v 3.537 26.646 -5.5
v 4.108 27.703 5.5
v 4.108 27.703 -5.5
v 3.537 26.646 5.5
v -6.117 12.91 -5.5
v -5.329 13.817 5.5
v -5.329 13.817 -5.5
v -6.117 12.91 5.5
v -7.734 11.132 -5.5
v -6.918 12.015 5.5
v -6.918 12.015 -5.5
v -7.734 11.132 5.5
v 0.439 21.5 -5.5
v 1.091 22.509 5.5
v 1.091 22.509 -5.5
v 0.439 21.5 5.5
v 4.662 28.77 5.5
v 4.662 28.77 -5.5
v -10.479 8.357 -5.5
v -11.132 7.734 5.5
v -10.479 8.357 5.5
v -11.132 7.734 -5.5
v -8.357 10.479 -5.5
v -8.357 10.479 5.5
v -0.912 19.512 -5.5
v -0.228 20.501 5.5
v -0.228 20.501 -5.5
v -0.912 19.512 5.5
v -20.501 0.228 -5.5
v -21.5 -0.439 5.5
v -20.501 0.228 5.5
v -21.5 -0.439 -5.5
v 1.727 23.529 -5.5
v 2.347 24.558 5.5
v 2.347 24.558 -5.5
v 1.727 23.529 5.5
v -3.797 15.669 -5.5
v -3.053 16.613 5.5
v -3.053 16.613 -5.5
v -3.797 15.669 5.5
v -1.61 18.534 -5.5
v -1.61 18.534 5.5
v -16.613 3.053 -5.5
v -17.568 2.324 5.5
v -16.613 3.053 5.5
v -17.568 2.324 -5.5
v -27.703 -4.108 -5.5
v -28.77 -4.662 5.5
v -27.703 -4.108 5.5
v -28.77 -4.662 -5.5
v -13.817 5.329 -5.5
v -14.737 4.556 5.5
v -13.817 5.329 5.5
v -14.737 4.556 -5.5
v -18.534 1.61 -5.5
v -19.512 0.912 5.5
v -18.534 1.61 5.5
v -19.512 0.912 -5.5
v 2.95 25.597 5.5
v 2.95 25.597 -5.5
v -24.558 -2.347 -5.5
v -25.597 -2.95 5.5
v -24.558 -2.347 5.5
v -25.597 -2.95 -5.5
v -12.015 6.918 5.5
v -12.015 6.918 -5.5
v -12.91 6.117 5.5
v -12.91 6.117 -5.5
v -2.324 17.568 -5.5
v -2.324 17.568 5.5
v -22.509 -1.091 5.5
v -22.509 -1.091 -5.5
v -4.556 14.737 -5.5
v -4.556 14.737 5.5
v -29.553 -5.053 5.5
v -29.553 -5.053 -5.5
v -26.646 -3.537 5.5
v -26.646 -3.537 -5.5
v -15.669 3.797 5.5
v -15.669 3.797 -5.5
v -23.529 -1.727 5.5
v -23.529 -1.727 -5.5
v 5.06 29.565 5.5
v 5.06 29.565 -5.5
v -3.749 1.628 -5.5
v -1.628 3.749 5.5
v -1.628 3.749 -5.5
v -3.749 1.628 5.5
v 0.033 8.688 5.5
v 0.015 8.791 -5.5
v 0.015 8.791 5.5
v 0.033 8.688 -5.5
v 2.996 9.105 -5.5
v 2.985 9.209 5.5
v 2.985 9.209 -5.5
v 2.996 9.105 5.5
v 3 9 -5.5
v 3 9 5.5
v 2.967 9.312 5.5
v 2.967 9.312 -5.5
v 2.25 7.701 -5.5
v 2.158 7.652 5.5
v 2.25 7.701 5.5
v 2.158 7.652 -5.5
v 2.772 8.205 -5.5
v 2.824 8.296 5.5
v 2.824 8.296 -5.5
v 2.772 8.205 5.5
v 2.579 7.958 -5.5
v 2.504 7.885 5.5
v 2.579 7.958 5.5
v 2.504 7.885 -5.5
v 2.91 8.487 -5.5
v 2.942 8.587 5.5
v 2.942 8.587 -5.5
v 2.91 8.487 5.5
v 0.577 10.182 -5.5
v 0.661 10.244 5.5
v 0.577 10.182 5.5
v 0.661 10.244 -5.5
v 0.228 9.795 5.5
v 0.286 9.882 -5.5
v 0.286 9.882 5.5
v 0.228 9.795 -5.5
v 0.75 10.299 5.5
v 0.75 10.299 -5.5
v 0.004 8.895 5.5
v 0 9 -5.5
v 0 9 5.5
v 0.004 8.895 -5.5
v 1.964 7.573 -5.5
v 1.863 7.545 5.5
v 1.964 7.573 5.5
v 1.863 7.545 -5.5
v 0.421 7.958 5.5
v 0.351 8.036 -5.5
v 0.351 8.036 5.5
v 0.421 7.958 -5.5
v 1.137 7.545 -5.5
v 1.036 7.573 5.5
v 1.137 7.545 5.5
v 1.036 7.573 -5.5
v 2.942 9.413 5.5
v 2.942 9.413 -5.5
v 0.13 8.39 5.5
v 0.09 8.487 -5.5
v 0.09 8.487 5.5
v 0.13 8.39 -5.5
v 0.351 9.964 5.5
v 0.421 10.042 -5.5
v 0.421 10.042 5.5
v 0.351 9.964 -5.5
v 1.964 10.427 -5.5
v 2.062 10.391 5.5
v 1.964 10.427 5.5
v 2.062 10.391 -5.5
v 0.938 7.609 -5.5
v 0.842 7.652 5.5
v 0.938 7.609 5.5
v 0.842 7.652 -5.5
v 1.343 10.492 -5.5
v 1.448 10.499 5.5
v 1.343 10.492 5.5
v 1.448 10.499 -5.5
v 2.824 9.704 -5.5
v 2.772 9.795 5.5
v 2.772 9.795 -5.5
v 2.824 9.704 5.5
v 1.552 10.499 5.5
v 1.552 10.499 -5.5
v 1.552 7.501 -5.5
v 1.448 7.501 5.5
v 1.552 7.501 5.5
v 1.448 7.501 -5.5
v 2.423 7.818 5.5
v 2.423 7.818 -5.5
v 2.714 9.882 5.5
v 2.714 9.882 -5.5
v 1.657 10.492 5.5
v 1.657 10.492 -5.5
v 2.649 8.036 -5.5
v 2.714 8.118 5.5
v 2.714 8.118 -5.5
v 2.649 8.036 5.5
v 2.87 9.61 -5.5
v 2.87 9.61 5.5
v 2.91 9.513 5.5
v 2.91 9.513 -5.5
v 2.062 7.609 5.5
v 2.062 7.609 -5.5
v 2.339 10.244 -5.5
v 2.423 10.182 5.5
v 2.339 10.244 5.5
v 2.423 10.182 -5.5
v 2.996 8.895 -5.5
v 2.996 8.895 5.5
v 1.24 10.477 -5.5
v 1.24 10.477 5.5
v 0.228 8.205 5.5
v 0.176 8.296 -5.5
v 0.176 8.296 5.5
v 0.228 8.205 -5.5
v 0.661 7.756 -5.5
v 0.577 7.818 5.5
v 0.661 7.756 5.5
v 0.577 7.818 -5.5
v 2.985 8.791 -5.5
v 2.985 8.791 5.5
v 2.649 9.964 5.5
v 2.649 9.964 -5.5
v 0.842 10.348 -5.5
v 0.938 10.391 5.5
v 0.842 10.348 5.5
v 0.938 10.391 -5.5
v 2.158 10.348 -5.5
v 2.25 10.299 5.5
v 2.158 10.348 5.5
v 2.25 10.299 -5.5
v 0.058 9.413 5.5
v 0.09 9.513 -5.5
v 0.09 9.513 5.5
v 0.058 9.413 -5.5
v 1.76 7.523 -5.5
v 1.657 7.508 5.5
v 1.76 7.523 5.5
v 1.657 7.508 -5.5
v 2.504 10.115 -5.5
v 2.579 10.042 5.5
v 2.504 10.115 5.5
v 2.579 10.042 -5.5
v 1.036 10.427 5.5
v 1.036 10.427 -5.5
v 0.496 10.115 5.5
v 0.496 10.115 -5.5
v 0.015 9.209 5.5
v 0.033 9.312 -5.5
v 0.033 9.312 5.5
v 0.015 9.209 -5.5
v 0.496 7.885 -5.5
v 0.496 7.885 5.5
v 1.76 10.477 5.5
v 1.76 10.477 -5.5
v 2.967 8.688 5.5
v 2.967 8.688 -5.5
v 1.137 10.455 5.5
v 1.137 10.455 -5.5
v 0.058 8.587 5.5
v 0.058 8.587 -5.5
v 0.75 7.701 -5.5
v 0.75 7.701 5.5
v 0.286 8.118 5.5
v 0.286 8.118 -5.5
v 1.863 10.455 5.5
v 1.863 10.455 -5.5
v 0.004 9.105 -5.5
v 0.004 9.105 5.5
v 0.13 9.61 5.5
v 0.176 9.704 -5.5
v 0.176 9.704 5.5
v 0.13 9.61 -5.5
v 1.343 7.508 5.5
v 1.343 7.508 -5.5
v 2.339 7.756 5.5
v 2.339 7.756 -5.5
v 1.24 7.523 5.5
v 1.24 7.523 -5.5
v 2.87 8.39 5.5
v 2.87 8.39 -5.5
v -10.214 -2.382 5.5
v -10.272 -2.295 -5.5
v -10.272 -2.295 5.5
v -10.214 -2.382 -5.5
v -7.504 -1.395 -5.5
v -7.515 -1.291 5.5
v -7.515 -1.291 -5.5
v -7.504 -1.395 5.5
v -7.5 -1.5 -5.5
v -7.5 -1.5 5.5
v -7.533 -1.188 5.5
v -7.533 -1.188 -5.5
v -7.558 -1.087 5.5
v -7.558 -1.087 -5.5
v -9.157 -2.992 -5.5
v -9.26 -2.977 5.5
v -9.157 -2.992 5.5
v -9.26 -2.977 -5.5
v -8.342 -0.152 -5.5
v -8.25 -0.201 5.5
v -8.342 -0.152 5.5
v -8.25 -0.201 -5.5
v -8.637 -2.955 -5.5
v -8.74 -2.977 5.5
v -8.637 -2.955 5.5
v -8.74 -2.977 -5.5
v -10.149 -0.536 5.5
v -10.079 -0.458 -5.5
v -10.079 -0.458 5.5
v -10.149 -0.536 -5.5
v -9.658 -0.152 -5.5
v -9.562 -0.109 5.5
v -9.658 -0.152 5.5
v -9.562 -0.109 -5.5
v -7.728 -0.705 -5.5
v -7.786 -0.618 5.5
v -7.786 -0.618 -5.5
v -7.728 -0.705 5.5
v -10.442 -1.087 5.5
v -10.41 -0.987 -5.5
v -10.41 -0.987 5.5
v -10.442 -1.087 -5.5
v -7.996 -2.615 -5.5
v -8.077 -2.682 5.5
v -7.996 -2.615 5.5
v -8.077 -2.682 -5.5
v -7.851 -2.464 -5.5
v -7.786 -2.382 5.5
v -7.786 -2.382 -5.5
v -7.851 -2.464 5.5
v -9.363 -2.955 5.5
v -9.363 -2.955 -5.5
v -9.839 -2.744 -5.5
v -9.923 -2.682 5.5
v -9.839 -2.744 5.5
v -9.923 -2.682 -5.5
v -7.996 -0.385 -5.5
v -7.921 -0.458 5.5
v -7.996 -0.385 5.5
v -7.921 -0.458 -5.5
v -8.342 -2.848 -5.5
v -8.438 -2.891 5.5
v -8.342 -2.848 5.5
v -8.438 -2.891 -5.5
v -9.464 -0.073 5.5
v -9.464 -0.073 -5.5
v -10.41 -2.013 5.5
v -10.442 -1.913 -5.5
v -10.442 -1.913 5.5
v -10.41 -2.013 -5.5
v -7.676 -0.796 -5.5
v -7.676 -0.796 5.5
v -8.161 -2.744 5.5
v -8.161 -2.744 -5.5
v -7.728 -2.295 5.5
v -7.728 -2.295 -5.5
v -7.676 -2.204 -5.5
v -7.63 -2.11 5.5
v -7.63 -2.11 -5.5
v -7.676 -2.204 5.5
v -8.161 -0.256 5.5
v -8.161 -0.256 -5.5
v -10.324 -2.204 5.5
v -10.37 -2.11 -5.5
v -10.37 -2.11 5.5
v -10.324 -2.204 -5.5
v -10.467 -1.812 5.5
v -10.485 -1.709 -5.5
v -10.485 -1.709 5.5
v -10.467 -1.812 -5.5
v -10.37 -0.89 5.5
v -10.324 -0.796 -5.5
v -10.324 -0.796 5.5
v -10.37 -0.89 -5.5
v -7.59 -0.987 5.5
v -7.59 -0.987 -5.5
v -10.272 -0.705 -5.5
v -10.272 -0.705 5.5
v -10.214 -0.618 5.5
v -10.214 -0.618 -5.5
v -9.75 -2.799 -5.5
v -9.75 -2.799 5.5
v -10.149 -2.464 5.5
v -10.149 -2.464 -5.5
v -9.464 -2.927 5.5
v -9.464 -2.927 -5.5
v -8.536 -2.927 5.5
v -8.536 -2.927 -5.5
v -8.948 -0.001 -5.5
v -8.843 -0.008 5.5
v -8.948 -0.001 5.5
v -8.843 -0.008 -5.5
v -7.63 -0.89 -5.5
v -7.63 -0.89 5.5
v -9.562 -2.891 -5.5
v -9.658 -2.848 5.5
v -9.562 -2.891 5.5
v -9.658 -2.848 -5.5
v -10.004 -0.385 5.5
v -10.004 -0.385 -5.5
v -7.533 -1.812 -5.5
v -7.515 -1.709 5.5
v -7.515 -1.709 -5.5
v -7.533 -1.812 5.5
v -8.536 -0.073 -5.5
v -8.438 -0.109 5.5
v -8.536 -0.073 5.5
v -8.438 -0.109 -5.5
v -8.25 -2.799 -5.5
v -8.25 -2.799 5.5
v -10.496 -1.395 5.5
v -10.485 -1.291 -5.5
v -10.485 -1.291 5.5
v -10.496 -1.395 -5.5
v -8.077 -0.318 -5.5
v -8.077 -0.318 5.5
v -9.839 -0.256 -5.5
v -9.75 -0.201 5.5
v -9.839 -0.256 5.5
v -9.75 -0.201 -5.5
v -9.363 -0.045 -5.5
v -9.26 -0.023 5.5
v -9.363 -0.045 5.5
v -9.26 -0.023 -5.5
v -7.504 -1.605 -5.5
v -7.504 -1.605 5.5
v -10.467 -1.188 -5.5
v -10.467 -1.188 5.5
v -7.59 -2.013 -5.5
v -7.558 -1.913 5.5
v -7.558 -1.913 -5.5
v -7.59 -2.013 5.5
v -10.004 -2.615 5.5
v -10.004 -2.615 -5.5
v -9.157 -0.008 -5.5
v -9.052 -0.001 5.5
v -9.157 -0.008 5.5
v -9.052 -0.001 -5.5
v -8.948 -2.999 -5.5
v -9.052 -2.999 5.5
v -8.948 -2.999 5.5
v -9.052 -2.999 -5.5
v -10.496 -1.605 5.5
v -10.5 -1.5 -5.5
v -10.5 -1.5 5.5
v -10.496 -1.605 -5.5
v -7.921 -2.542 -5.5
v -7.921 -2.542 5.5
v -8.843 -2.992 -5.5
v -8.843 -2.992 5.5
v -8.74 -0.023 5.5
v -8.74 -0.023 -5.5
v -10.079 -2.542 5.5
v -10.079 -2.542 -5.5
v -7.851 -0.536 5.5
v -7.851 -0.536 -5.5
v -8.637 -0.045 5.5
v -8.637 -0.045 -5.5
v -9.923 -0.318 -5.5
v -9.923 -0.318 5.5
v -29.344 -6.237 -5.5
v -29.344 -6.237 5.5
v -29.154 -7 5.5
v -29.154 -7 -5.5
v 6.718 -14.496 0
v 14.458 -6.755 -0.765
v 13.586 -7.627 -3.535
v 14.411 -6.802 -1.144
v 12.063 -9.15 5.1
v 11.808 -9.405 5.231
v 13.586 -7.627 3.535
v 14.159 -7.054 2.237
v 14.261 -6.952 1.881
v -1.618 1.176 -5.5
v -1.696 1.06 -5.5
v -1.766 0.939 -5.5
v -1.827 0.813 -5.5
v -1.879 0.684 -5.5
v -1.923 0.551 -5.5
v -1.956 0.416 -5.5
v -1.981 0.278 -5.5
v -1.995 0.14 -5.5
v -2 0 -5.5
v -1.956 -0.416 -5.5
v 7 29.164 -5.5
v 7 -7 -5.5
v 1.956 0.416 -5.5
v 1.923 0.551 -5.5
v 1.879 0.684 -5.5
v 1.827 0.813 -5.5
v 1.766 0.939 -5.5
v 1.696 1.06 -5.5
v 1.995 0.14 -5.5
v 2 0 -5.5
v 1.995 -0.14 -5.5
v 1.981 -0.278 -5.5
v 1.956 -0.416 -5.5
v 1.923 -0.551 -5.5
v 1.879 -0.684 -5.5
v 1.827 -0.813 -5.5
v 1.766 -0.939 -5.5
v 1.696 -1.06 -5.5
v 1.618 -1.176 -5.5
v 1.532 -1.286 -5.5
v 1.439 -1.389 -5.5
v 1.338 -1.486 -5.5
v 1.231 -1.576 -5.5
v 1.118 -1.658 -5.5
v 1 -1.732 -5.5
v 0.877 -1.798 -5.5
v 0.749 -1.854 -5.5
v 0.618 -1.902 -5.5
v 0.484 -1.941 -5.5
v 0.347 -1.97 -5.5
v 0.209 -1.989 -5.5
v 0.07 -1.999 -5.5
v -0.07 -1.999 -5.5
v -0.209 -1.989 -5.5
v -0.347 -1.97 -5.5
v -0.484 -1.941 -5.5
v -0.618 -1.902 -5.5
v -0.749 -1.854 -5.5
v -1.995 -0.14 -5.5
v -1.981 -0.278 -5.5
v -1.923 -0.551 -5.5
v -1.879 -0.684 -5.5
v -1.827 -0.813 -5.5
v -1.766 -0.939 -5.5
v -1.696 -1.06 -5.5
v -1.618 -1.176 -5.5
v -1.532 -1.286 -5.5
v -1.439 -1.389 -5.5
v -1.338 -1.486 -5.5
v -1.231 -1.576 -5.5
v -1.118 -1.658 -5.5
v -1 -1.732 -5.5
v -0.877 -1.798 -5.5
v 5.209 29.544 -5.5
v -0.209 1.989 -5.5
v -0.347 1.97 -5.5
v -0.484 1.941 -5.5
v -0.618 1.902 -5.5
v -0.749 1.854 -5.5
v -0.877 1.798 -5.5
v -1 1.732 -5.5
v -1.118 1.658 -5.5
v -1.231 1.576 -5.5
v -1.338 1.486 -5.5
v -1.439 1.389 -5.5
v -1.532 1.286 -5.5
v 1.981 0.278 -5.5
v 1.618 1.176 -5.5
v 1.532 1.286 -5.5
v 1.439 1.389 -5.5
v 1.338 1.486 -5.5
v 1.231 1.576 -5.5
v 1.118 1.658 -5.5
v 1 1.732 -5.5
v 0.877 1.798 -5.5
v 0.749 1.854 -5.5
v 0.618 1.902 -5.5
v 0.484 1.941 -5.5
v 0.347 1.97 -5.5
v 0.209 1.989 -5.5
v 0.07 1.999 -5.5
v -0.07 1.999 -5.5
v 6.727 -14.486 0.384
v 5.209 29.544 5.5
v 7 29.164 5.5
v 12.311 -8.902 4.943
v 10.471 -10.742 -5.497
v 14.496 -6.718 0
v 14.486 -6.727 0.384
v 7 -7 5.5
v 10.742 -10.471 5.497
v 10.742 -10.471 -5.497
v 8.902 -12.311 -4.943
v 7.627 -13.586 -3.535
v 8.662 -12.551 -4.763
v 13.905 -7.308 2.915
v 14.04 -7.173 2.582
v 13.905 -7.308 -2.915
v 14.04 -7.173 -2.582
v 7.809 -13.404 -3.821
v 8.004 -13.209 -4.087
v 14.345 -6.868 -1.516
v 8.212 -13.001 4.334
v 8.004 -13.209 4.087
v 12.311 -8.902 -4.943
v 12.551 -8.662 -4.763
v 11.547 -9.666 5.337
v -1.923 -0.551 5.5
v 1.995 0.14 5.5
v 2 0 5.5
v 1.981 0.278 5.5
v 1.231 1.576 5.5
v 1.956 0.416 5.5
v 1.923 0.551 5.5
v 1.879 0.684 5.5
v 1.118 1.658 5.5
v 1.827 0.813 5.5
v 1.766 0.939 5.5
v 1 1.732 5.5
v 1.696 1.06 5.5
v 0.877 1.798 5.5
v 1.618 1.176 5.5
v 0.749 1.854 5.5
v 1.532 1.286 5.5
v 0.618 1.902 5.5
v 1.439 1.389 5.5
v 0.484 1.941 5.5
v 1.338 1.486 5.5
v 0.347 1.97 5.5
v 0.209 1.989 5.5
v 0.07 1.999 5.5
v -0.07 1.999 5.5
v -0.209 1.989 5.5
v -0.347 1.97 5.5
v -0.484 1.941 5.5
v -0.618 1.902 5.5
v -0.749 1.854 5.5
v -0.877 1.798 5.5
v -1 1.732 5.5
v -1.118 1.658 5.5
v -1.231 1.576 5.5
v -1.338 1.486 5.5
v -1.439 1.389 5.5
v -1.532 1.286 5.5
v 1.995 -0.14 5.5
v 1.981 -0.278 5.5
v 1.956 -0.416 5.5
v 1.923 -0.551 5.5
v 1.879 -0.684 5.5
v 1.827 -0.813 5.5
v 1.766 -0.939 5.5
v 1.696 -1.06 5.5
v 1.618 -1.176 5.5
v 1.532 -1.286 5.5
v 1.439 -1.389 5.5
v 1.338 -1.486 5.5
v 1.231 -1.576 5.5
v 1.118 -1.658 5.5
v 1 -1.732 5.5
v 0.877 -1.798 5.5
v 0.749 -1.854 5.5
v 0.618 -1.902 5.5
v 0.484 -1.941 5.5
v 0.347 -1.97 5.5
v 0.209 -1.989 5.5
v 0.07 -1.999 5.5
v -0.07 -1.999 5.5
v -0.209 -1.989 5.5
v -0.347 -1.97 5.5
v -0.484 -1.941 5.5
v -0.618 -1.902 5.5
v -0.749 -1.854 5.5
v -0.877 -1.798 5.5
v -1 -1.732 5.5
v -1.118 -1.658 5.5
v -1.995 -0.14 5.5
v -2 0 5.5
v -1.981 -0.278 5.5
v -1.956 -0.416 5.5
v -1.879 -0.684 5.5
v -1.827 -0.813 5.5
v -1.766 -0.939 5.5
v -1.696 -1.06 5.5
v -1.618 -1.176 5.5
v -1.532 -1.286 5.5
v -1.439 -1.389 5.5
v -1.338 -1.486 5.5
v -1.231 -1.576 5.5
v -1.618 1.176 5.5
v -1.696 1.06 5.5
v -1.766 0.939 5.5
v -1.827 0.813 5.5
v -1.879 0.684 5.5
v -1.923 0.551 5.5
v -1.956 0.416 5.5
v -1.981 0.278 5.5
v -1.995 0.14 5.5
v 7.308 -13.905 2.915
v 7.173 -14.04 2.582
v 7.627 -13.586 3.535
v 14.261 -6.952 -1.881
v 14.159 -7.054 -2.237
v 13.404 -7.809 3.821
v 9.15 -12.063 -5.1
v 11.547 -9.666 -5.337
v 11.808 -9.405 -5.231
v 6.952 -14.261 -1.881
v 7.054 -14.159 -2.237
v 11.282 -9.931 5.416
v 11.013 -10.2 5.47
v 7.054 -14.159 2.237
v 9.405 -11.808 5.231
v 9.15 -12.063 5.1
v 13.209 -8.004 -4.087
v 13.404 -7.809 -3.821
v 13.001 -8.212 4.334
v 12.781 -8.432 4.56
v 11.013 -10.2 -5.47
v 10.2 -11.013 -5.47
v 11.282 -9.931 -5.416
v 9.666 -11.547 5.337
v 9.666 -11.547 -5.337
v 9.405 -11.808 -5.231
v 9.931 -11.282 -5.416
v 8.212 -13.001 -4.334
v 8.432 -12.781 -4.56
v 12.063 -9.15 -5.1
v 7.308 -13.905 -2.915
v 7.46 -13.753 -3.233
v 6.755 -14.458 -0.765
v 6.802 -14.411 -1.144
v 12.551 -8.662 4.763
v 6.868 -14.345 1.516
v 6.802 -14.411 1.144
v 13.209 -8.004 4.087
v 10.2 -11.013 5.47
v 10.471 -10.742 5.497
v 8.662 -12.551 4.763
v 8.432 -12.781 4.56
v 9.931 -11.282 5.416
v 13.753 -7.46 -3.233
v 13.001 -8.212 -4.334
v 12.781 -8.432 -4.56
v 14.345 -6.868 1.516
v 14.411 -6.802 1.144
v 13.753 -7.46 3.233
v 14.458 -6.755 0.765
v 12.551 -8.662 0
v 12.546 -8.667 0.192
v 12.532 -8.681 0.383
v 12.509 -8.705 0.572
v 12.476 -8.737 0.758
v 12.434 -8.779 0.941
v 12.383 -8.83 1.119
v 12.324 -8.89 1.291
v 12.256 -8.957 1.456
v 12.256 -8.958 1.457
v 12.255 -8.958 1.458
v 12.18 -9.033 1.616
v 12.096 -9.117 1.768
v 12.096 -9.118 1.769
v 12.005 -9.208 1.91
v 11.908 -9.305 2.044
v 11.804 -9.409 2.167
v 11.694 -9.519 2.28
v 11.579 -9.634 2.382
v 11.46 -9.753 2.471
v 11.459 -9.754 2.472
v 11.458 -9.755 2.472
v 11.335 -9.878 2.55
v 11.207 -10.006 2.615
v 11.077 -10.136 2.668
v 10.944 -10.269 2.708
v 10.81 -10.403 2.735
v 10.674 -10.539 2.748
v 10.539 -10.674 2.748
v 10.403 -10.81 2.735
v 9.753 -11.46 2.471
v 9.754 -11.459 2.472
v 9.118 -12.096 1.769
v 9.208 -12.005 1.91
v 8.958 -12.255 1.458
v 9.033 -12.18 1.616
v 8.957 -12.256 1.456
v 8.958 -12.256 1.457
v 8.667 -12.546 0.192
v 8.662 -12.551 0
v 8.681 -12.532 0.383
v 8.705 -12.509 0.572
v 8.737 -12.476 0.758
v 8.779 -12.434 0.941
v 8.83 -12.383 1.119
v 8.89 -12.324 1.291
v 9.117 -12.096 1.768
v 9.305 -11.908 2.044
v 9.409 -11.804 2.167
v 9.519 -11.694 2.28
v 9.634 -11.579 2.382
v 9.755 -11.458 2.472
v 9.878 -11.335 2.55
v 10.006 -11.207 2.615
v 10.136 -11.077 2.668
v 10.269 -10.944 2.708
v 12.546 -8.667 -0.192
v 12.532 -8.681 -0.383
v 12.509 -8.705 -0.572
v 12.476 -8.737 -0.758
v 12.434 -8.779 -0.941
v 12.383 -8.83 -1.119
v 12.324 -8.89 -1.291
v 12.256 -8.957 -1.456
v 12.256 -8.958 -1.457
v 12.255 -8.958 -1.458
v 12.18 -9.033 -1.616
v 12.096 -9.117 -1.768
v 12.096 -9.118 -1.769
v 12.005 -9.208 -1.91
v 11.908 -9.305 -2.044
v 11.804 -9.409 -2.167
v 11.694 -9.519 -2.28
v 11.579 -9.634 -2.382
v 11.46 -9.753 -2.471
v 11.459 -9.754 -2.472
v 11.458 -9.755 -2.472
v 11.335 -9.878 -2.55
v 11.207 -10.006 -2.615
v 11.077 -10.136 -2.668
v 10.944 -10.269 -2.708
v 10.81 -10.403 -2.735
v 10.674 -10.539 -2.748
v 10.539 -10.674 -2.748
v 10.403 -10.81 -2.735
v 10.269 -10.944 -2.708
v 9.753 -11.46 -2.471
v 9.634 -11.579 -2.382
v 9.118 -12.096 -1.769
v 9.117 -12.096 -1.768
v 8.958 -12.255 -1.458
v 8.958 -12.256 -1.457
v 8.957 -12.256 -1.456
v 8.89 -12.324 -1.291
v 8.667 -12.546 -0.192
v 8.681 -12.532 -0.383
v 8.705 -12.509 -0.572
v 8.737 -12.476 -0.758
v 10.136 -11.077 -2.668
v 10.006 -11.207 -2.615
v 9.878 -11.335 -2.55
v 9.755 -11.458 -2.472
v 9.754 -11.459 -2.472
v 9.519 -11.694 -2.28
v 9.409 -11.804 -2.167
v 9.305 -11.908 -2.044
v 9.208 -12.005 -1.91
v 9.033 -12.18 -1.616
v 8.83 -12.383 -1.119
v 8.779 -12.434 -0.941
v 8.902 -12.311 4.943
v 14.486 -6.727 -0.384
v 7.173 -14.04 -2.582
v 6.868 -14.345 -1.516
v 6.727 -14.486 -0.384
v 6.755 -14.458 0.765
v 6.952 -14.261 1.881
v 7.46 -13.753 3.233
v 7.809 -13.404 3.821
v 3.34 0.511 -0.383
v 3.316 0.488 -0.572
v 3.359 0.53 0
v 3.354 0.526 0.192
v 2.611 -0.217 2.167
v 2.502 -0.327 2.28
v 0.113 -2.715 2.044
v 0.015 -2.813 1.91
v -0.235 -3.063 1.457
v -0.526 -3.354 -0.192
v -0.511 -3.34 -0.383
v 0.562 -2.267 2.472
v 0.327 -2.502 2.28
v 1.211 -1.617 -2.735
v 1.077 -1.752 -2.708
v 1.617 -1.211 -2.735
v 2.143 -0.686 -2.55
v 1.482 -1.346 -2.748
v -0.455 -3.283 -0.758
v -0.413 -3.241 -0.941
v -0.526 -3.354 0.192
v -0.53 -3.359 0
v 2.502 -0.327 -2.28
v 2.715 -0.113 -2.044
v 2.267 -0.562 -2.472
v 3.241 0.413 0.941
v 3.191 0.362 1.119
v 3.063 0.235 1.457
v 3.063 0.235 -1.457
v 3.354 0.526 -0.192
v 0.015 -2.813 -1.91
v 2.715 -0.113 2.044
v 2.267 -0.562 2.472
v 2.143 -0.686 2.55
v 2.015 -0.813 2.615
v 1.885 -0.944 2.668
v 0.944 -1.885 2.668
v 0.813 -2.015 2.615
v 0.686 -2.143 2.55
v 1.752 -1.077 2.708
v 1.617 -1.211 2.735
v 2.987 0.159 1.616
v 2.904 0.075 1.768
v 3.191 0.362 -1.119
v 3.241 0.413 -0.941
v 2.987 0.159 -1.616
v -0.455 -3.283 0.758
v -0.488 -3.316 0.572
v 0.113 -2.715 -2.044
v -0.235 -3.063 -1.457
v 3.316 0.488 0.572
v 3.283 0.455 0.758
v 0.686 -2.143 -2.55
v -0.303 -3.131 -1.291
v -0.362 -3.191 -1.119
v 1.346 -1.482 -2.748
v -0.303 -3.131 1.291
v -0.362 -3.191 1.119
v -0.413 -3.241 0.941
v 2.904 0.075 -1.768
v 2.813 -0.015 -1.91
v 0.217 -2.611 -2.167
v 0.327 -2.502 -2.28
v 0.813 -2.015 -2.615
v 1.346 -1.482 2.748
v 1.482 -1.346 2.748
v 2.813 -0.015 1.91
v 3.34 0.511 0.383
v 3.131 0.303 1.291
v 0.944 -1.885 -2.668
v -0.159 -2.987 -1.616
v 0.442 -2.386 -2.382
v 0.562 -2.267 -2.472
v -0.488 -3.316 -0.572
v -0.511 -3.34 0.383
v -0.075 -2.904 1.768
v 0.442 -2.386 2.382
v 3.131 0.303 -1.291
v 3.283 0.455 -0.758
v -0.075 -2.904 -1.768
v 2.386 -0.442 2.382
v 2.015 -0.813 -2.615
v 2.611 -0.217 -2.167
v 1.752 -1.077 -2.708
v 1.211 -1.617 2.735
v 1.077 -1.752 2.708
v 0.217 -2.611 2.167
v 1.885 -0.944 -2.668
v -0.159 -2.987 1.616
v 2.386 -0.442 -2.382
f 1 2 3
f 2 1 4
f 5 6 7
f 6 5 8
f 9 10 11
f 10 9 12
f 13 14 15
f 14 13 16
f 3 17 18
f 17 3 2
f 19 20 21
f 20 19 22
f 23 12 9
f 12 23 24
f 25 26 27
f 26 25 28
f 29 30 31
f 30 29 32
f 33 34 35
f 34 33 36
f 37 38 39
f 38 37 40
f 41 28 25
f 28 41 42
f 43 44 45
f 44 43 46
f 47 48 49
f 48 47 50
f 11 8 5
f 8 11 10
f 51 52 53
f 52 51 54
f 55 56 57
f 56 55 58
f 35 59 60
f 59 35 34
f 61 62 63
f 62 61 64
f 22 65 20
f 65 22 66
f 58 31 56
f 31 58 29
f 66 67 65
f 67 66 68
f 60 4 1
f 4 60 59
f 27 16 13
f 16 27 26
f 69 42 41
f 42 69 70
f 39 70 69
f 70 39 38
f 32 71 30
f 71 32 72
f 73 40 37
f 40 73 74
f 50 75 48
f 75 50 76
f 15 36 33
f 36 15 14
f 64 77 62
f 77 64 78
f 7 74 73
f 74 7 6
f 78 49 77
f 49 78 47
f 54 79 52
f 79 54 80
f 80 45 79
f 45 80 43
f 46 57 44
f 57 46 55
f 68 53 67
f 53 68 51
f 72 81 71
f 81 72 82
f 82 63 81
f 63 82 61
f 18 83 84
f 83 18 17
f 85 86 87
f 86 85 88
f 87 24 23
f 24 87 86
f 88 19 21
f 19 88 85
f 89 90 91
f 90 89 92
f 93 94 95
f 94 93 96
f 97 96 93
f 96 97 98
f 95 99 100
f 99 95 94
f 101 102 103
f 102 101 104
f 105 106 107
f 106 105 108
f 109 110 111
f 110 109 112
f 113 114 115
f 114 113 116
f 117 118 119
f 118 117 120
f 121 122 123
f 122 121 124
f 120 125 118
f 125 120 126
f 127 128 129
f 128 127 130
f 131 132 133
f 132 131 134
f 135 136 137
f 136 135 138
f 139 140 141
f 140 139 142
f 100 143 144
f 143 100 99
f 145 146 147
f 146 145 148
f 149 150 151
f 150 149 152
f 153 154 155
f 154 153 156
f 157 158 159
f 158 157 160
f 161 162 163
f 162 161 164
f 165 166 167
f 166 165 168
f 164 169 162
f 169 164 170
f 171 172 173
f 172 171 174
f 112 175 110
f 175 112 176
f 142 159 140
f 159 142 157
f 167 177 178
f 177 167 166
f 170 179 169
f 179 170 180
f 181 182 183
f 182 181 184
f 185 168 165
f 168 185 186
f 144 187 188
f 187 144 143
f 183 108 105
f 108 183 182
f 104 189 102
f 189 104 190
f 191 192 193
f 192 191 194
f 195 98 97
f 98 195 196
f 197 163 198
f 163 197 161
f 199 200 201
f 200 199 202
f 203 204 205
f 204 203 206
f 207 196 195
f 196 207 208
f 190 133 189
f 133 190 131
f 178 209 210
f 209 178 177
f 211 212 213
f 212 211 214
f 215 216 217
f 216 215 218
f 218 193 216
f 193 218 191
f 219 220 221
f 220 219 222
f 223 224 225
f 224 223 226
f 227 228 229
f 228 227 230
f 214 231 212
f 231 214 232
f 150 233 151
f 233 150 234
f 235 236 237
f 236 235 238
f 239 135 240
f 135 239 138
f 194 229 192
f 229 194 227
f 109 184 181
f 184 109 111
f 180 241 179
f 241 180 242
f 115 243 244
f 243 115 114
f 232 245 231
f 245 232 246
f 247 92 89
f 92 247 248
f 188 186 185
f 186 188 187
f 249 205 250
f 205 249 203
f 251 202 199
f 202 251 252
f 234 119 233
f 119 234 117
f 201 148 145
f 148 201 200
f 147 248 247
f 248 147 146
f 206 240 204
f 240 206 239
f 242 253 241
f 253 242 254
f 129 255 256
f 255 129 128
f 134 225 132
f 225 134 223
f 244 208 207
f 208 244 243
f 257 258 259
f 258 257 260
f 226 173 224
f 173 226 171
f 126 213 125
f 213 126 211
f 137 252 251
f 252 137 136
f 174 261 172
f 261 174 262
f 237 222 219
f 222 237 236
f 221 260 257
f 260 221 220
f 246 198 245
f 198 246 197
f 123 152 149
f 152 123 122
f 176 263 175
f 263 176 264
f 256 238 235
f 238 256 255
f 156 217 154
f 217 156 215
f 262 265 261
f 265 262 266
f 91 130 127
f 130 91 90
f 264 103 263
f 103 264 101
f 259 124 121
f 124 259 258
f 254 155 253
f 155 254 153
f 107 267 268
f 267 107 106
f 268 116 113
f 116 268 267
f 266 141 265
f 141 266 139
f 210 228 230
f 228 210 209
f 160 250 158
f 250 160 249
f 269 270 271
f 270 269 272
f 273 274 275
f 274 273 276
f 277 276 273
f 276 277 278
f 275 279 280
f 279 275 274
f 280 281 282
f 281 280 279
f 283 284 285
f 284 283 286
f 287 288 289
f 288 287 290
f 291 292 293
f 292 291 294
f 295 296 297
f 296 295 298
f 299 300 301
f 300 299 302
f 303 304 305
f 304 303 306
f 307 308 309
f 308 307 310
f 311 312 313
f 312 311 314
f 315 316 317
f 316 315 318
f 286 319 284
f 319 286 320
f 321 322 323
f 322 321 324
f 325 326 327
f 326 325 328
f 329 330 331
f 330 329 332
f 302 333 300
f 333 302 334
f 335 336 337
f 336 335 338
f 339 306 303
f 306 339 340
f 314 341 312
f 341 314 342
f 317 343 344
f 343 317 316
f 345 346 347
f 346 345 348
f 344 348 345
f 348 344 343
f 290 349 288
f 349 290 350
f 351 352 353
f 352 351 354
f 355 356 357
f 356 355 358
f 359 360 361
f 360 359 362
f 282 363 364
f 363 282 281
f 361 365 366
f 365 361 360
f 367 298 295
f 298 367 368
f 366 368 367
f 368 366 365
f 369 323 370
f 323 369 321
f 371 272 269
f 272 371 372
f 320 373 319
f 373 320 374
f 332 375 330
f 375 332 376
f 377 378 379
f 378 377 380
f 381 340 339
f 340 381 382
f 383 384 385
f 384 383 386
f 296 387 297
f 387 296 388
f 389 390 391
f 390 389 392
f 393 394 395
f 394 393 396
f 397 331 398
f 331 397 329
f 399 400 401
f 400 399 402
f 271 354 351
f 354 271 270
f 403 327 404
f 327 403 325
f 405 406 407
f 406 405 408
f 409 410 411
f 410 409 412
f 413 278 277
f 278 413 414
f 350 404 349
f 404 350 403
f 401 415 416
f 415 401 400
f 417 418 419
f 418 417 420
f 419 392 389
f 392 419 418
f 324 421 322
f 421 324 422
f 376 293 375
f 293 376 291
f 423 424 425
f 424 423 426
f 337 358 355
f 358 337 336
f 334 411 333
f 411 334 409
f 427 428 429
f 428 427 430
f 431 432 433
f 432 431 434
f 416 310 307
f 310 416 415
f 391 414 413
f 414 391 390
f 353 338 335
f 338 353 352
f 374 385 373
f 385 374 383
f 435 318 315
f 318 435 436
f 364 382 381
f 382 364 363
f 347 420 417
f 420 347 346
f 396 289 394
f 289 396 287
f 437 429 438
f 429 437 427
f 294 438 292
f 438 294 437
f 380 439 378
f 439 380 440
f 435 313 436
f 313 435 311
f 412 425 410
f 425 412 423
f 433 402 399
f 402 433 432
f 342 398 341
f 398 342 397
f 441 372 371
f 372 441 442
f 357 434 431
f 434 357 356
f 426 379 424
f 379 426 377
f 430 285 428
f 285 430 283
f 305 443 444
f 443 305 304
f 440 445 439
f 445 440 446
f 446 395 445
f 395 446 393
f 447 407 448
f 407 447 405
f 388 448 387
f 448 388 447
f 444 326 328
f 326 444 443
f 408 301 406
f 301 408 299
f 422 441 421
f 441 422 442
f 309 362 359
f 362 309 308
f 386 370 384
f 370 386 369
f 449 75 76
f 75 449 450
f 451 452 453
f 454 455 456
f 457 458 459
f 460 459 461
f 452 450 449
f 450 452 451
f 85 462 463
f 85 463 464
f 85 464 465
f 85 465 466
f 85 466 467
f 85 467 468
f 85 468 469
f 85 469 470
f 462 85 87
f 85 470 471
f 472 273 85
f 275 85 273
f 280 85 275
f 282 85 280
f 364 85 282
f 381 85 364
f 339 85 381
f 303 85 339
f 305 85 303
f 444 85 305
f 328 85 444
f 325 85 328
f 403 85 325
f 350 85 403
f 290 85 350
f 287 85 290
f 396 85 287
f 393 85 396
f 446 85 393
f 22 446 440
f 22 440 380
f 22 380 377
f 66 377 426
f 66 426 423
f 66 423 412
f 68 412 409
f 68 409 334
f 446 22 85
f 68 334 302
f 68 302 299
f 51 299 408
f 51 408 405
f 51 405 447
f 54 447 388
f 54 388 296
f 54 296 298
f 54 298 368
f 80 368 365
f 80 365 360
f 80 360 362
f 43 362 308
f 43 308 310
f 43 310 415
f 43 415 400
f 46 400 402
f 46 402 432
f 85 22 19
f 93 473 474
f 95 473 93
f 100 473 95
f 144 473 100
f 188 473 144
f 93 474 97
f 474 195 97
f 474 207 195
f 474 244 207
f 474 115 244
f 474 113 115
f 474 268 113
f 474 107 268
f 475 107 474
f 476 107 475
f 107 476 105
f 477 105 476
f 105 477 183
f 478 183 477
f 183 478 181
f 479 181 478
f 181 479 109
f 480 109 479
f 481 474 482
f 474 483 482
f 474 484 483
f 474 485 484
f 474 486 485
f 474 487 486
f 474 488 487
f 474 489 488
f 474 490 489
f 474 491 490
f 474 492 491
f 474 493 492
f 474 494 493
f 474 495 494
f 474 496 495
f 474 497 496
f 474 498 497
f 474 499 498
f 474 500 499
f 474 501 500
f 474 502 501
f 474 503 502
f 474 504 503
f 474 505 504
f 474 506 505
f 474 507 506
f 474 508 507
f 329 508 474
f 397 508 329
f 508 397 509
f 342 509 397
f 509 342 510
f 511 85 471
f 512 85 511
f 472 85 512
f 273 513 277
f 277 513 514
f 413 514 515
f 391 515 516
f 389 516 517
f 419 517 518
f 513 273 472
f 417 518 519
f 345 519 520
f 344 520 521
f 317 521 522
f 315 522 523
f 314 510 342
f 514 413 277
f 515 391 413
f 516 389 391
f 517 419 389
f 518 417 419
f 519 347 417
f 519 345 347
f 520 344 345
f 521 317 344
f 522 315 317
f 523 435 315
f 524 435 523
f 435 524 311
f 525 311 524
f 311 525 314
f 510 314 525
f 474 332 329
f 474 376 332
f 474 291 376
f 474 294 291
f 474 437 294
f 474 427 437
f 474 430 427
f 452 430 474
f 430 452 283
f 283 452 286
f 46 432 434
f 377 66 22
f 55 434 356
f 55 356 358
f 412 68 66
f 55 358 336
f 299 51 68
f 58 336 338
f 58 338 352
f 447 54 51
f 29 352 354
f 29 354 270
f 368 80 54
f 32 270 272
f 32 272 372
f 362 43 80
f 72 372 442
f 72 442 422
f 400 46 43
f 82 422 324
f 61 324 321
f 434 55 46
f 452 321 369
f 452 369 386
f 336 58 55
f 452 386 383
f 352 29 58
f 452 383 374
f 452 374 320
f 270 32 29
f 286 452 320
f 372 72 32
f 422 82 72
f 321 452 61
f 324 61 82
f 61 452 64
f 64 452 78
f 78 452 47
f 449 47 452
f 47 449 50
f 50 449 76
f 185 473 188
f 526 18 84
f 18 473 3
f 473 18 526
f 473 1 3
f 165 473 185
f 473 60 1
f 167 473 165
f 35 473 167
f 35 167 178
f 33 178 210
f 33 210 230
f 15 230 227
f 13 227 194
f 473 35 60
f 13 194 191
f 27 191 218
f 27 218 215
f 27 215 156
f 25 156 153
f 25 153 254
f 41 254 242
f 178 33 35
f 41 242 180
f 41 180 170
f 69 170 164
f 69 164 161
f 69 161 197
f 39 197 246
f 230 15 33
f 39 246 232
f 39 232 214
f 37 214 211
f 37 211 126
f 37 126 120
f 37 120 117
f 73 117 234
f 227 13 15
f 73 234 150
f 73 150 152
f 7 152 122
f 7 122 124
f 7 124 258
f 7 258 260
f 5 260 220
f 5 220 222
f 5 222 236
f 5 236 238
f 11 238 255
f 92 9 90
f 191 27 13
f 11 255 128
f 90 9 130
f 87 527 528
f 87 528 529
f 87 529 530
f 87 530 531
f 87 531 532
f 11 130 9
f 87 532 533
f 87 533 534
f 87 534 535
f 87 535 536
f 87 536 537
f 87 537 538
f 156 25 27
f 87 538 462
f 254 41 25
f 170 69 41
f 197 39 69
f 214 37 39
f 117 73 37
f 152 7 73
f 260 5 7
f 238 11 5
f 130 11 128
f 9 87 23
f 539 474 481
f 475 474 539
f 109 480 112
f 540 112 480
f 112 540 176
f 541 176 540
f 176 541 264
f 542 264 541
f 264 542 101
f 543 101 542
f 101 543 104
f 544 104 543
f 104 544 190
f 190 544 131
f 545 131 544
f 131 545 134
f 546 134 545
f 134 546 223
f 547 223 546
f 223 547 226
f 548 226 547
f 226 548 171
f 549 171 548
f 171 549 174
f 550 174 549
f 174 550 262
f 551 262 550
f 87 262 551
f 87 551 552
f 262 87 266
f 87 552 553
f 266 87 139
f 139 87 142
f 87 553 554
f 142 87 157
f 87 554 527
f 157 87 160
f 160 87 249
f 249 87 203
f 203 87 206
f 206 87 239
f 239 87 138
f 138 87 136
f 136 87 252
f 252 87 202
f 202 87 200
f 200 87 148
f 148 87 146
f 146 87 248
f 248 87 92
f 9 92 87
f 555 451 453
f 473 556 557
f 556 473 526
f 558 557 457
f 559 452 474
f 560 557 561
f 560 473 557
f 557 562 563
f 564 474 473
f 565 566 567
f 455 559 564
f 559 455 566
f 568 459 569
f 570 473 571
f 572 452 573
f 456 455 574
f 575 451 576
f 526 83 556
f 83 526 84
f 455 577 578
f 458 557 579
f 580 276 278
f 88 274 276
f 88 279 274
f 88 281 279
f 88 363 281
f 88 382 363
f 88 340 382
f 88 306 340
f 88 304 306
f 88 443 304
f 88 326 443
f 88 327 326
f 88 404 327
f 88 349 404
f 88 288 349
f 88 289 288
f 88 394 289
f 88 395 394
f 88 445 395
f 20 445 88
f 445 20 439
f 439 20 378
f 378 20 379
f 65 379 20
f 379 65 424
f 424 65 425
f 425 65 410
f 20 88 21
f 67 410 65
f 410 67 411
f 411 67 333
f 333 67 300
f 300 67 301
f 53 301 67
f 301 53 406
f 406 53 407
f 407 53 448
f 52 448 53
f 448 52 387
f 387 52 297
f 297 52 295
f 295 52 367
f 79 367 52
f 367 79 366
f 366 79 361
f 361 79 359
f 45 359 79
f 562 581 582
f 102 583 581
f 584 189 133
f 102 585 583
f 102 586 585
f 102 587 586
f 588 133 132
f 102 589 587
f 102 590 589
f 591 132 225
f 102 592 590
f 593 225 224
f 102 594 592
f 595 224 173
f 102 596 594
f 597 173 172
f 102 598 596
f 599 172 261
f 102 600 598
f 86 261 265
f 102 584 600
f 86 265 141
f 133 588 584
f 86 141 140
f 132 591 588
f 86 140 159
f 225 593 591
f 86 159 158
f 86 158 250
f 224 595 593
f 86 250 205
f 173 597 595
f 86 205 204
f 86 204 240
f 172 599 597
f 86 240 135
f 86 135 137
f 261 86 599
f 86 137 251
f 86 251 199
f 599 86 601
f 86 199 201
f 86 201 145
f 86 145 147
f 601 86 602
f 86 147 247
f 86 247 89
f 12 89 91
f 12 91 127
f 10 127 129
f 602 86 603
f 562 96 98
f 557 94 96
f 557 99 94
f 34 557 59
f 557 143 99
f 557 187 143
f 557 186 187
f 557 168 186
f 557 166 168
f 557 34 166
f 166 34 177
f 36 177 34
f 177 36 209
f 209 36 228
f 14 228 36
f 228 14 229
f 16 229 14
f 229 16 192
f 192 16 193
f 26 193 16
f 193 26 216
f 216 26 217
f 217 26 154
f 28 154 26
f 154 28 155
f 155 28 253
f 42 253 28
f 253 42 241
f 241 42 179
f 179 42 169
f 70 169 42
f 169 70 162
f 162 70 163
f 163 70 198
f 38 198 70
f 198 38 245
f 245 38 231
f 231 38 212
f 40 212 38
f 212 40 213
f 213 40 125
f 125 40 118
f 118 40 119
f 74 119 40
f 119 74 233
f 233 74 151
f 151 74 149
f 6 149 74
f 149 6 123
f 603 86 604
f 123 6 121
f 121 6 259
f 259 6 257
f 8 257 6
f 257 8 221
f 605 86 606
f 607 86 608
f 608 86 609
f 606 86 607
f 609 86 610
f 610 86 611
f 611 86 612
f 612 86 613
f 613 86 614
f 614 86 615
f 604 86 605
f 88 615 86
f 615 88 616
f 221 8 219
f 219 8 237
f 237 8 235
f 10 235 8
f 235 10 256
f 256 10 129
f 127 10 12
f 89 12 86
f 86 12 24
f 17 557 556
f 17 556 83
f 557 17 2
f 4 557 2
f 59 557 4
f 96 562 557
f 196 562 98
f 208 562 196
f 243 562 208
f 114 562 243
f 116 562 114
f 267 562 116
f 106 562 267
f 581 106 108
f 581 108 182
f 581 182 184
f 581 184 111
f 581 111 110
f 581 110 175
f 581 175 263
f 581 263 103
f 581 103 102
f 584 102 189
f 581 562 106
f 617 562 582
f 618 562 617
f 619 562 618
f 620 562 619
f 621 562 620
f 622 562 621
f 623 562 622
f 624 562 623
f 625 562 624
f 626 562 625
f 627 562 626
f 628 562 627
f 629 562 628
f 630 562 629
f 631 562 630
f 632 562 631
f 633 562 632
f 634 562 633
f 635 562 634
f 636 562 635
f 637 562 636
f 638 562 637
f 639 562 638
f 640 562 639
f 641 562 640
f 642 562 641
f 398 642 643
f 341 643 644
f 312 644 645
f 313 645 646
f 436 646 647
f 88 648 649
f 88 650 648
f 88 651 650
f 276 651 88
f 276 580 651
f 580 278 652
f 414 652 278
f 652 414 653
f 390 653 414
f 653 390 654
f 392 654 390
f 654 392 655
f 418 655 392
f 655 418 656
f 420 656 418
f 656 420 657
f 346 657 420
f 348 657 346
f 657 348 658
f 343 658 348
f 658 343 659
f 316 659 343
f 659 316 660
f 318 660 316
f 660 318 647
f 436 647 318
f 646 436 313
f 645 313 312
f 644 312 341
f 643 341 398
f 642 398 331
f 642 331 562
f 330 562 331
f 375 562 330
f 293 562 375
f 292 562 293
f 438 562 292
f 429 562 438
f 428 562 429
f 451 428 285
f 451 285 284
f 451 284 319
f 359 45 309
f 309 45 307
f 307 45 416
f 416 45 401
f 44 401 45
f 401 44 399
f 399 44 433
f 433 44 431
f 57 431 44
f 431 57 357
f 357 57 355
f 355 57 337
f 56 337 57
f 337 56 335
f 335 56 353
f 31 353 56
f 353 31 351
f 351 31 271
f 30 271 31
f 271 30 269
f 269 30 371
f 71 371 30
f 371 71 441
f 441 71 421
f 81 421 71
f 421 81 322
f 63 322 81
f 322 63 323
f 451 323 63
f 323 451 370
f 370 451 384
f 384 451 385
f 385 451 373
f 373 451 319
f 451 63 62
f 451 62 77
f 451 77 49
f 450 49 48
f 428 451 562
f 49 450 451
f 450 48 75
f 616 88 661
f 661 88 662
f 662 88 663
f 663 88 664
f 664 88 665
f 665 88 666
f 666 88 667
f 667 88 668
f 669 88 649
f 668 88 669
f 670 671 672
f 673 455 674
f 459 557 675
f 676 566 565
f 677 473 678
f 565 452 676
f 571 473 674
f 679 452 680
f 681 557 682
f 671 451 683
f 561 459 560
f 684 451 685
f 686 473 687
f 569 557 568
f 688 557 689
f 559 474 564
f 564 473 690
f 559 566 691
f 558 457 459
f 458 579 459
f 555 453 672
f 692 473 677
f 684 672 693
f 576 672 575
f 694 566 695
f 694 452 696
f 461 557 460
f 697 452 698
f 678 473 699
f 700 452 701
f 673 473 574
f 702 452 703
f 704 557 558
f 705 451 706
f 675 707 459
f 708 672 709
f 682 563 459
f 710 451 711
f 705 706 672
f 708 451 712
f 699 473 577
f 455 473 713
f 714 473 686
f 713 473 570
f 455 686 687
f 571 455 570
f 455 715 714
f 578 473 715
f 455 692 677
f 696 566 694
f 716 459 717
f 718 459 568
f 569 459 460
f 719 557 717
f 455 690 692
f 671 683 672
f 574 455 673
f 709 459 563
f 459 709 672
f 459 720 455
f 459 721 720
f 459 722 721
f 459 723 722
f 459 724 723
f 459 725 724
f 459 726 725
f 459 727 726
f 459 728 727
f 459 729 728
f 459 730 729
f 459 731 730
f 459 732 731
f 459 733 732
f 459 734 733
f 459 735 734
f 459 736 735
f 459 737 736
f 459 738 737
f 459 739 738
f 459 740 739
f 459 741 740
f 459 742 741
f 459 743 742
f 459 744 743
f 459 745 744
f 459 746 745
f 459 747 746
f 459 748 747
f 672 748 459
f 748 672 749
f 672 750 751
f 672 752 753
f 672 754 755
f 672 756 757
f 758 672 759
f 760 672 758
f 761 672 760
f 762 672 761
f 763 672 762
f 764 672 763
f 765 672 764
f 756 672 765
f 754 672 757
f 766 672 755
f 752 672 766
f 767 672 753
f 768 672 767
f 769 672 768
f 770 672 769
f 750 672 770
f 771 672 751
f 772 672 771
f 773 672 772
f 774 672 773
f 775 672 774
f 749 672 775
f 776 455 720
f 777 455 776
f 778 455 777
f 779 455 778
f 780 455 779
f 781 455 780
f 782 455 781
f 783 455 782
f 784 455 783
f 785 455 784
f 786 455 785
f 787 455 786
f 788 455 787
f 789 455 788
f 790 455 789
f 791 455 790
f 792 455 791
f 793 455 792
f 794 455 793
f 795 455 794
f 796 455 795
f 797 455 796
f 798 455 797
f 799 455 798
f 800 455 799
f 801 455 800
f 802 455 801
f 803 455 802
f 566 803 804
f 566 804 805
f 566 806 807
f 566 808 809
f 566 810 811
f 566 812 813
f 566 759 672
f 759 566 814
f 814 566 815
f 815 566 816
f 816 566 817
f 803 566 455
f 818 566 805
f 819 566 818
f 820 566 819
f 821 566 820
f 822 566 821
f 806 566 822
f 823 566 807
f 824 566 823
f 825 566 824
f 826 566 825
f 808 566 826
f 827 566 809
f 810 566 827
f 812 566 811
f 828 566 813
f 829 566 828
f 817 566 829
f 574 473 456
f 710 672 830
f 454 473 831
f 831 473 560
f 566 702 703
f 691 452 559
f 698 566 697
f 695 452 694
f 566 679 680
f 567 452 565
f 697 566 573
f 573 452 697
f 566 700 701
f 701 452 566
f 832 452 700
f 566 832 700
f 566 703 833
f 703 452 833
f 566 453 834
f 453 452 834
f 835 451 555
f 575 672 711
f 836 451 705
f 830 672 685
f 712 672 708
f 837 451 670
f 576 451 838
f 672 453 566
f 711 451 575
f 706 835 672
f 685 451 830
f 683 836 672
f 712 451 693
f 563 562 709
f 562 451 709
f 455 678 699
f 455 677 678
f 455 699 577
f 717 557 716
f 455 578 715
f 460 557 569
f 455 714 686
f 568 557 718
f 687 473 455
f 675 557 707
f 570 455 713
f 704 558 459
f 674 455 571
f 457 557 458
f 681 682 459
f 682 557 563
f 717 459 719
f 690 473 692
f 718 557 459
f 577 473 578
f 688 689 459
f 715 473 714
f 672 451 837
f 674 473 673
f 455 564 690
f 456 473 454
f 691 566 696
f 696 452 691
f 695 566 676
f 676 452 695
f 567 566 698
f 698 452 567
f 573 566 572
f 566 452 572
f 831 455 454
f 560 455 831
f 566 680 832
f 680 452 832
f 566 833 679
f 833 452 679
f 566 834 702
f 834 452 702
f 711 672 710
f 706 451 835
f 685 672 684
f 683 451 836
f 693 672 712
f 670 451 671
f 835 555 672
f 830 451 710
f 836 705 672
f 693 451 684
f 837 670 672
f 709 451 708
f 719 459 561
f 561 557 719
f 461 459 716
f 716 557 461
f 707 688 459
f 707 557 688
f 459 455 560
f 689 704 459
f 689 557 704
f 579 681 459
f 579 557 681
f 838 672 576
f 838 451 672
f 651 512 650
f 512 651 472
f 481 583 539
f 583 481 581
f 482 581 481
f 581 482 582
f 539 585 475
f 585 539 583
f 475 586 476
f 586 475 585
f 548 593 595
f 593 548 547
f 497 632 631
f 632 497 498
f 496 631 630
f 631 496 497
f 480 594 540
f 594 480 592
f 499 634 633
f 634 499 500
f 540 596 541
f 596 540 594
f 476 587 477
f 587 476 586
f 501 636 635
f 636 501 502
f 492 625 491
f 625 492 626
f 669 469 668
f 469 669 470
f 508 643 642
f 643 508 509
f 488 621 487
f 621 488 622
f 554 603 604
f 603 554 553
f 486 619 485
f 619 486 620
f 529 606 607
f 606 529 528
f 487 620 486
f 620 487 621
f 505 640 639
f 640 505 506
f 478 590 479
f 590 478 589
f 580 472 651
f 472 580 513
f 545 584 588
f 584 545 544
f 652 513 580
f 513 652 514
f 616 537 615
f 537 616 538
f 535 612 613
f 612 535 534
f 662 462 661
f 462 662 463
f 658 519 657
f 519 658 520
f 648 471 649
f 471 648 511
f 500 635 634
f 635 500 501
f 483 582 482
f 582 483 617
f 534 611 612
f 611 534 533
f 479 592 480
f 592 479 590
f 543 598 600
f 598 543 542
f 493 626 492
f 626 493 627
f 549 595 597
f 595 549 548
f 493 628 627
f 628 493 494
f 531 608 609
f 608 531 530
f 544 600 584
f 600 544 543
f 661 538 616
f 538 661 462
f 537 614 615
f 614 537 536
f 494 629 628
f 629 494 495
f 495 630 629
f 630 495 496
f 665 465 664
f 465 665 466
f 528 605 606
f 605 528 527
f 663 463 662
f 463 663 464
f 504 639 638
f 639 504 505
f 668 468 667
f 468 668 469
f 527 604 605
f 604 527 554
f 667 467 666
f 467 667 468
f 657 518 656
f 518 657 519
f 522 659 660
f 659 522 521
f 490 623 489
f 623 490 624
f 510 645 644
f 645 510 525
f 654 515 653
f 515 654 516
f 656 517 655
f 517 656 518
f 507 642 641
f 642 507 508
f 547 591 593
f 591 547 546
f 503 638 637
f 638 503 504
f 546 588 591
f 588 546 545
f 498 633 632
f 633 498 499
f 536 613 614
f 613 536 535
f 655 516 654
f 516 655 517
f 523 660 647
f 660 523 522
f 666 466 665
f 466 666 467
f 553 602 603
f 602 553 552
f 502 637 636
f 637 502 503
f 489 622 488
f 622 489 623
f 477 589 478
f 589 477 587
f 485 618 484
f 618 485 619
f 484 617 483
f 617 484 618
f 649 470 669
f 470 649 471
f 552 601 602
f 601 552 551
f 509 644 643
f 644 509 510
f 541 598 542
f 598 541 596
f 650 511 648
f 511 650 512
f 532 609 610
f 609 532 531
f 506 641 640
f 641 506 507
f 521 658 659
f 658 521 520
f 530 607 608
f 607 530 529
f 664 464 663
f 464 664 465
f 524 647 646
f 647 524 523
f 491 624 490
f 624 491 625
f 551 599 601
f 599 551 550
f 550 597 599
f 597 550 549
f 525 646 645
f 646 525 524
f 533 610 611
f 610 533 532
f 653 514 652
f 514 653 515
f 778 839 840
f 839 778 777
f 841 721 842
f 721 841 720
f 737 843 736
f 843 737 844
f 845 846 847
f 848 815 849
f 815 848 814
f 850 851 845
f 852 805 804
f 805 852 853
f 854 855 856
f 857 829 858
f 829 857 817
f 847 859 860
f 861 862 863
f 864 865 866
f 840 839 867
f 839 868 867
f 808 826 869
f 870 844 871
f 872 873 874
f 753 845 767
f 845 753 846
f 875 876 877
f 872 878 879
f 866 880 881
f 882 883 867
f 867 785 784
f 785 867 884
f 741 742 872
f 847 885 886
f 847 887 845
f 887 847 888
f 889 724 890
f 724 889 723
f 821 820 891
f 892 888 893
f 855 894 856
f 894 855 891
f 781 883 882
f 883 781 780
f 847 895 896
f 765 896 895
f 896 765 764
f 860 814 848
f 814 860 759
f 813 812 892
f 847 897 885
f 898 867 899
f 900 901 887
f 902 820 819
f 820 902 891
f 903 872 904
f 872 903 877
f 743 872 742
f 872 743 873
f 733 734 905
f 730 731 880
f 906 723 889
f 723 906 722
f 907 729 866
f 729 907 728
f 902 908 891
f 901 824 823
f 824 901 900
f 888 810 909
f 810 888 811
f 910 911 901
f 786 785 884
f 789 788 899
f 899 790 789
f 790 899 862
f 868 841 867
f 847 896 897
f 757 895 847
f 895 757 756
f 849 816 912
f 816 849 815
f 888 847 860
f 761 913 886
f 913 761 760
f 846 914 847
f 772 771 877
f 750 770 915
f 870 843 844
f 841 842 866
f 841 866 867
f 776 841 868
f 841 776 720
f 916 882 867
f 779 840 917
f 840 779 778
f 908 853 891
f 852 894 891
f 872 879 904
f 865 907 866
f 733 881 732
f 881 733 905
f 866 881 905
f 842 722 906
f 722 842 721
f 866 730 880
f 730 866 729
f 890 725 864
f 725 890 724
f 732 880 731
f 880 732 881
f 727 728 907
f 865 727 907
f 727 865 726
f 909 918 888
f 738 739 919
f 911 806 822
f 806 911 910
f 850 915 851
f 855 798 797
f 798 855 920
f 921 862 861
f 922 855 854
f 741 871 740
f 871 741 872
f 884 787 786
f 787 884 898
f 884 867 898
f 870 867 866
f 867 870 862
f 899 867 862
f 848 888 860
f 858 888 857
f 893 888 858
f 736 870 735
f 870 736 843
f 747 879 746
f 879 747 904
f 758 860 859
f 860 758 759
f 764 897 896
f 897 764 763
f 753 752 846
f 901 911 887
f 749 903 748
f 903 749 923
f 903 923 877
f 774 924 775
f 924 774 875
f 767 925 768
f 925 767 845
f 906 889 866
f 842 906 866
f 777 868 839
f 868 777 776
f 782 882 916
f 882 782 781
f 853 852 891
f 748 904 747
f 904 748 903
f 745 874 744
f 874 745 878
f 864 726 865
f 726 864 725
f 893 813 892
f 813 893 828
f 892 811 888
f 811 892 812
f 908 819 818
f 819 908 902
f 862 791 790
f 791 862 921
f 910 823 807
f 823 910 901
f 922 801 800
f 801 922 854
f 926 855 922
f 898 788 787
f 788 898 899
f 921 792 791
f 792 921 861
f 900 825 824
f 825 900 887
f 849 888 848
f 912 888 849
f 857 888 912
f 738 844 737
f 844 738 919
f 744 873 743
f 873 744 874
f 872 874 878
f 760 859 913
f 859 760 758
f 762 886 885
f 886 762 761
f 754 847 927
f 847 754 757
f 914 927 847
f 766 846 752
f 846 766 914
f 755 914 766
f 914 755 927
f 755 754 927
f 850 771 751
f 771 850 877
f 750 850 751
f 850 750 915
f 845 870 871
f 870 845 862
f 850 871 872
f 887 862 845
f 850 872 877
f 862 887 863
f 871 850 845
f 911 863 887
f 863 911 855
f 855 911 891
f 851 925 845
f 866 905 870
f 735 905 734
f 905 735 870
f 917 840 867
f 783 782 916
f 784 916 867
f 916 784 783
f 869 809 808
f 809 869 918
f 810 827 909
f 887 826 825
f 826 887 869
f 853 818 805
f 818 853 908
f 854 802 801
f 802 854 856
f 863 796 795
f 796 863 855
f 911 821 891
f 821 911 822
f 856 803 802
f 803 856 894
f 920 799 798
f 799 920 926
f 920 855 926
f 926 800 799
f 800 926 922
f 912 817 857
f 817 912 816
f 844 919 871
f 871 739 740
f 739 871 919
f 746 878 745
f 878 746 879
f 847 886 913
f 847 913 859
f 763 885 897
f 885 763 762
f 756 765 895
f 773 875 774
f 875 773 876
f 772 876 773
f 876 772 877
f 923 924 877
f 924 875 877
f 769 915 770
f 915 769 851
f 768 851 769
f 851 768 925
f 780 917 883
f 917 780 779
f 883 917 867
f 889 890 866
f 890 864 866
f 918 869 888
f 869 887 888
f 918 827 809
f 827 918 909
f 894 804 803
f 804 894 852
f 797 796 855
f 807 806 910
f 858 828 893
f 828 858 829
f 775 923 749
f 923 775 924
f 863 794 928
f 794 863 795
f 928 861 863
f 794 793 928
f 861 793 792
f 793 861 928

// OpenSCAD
fan=153;
cage=141;
screw=4;

fan_h=11;

shock=3;
shock_x=5.5;
shock_y=16;

rib_y=3;
rib_x=9;

mount=5.5;
mount_h=13;


//mount_od=mount_wall*2+mount;
//mount_wall=5;

mount_od=fan_h;

screw_offset=7;

pad=0.1;

keep=30;
big_fn=400;
$fn=90;



module place_fan() {
    translate([-cage/2+screw_offset,cage/2-screw_offset,0])
    children();
}

module fan_negative() {
    cylinder(d=fan,h=fan_h+pad*2,center=true,$fn=big_fn);
    rotate([0,0,-45])
    translate([fan/2+rib_x/2,0,0])
    cube([rib_x+1,rib_y,fan_h+pad*2],center=true);
}

module fan_body() {
    difference() {
        cube([cage,cage,fan_h],center=true);
        fan_negative();
    }
}

module fan() {
    intersection() {
        place_fan()
        fan_body();
        keep();
    }
}

module keep() {
    cylinder(d=keep*2,h=fan_h+pad*2,center=true);
}

module body() {
    hull() {
        fan();
        place_mount()
        cylinder(d=mount_od,h=mount_h);
    }
}

module shock() {
    translate([screw_offset,-screw_offset])
    cylinder(d=shock,h=fan_h+pad*2,center=true);
}

module shocks() {
    translate([-shock_x,shock_y])
    shock();
    translate([-shock_y,shock_x])
    shock();
}


module assembled() {
    difference() {
        body();
        place_fan()
        fan_negative();
        cylinder(d=screw,h=fan_h+pad*2,center=true);
        shocks();
        place_mount()
        cylinder(d=mount,h=mount_h+pad);
    }
}

//fan_body();

assembled();


module place_mount() {
    rotate([90,0,45])
    translate([0,0,screw/2])
    children();
}
